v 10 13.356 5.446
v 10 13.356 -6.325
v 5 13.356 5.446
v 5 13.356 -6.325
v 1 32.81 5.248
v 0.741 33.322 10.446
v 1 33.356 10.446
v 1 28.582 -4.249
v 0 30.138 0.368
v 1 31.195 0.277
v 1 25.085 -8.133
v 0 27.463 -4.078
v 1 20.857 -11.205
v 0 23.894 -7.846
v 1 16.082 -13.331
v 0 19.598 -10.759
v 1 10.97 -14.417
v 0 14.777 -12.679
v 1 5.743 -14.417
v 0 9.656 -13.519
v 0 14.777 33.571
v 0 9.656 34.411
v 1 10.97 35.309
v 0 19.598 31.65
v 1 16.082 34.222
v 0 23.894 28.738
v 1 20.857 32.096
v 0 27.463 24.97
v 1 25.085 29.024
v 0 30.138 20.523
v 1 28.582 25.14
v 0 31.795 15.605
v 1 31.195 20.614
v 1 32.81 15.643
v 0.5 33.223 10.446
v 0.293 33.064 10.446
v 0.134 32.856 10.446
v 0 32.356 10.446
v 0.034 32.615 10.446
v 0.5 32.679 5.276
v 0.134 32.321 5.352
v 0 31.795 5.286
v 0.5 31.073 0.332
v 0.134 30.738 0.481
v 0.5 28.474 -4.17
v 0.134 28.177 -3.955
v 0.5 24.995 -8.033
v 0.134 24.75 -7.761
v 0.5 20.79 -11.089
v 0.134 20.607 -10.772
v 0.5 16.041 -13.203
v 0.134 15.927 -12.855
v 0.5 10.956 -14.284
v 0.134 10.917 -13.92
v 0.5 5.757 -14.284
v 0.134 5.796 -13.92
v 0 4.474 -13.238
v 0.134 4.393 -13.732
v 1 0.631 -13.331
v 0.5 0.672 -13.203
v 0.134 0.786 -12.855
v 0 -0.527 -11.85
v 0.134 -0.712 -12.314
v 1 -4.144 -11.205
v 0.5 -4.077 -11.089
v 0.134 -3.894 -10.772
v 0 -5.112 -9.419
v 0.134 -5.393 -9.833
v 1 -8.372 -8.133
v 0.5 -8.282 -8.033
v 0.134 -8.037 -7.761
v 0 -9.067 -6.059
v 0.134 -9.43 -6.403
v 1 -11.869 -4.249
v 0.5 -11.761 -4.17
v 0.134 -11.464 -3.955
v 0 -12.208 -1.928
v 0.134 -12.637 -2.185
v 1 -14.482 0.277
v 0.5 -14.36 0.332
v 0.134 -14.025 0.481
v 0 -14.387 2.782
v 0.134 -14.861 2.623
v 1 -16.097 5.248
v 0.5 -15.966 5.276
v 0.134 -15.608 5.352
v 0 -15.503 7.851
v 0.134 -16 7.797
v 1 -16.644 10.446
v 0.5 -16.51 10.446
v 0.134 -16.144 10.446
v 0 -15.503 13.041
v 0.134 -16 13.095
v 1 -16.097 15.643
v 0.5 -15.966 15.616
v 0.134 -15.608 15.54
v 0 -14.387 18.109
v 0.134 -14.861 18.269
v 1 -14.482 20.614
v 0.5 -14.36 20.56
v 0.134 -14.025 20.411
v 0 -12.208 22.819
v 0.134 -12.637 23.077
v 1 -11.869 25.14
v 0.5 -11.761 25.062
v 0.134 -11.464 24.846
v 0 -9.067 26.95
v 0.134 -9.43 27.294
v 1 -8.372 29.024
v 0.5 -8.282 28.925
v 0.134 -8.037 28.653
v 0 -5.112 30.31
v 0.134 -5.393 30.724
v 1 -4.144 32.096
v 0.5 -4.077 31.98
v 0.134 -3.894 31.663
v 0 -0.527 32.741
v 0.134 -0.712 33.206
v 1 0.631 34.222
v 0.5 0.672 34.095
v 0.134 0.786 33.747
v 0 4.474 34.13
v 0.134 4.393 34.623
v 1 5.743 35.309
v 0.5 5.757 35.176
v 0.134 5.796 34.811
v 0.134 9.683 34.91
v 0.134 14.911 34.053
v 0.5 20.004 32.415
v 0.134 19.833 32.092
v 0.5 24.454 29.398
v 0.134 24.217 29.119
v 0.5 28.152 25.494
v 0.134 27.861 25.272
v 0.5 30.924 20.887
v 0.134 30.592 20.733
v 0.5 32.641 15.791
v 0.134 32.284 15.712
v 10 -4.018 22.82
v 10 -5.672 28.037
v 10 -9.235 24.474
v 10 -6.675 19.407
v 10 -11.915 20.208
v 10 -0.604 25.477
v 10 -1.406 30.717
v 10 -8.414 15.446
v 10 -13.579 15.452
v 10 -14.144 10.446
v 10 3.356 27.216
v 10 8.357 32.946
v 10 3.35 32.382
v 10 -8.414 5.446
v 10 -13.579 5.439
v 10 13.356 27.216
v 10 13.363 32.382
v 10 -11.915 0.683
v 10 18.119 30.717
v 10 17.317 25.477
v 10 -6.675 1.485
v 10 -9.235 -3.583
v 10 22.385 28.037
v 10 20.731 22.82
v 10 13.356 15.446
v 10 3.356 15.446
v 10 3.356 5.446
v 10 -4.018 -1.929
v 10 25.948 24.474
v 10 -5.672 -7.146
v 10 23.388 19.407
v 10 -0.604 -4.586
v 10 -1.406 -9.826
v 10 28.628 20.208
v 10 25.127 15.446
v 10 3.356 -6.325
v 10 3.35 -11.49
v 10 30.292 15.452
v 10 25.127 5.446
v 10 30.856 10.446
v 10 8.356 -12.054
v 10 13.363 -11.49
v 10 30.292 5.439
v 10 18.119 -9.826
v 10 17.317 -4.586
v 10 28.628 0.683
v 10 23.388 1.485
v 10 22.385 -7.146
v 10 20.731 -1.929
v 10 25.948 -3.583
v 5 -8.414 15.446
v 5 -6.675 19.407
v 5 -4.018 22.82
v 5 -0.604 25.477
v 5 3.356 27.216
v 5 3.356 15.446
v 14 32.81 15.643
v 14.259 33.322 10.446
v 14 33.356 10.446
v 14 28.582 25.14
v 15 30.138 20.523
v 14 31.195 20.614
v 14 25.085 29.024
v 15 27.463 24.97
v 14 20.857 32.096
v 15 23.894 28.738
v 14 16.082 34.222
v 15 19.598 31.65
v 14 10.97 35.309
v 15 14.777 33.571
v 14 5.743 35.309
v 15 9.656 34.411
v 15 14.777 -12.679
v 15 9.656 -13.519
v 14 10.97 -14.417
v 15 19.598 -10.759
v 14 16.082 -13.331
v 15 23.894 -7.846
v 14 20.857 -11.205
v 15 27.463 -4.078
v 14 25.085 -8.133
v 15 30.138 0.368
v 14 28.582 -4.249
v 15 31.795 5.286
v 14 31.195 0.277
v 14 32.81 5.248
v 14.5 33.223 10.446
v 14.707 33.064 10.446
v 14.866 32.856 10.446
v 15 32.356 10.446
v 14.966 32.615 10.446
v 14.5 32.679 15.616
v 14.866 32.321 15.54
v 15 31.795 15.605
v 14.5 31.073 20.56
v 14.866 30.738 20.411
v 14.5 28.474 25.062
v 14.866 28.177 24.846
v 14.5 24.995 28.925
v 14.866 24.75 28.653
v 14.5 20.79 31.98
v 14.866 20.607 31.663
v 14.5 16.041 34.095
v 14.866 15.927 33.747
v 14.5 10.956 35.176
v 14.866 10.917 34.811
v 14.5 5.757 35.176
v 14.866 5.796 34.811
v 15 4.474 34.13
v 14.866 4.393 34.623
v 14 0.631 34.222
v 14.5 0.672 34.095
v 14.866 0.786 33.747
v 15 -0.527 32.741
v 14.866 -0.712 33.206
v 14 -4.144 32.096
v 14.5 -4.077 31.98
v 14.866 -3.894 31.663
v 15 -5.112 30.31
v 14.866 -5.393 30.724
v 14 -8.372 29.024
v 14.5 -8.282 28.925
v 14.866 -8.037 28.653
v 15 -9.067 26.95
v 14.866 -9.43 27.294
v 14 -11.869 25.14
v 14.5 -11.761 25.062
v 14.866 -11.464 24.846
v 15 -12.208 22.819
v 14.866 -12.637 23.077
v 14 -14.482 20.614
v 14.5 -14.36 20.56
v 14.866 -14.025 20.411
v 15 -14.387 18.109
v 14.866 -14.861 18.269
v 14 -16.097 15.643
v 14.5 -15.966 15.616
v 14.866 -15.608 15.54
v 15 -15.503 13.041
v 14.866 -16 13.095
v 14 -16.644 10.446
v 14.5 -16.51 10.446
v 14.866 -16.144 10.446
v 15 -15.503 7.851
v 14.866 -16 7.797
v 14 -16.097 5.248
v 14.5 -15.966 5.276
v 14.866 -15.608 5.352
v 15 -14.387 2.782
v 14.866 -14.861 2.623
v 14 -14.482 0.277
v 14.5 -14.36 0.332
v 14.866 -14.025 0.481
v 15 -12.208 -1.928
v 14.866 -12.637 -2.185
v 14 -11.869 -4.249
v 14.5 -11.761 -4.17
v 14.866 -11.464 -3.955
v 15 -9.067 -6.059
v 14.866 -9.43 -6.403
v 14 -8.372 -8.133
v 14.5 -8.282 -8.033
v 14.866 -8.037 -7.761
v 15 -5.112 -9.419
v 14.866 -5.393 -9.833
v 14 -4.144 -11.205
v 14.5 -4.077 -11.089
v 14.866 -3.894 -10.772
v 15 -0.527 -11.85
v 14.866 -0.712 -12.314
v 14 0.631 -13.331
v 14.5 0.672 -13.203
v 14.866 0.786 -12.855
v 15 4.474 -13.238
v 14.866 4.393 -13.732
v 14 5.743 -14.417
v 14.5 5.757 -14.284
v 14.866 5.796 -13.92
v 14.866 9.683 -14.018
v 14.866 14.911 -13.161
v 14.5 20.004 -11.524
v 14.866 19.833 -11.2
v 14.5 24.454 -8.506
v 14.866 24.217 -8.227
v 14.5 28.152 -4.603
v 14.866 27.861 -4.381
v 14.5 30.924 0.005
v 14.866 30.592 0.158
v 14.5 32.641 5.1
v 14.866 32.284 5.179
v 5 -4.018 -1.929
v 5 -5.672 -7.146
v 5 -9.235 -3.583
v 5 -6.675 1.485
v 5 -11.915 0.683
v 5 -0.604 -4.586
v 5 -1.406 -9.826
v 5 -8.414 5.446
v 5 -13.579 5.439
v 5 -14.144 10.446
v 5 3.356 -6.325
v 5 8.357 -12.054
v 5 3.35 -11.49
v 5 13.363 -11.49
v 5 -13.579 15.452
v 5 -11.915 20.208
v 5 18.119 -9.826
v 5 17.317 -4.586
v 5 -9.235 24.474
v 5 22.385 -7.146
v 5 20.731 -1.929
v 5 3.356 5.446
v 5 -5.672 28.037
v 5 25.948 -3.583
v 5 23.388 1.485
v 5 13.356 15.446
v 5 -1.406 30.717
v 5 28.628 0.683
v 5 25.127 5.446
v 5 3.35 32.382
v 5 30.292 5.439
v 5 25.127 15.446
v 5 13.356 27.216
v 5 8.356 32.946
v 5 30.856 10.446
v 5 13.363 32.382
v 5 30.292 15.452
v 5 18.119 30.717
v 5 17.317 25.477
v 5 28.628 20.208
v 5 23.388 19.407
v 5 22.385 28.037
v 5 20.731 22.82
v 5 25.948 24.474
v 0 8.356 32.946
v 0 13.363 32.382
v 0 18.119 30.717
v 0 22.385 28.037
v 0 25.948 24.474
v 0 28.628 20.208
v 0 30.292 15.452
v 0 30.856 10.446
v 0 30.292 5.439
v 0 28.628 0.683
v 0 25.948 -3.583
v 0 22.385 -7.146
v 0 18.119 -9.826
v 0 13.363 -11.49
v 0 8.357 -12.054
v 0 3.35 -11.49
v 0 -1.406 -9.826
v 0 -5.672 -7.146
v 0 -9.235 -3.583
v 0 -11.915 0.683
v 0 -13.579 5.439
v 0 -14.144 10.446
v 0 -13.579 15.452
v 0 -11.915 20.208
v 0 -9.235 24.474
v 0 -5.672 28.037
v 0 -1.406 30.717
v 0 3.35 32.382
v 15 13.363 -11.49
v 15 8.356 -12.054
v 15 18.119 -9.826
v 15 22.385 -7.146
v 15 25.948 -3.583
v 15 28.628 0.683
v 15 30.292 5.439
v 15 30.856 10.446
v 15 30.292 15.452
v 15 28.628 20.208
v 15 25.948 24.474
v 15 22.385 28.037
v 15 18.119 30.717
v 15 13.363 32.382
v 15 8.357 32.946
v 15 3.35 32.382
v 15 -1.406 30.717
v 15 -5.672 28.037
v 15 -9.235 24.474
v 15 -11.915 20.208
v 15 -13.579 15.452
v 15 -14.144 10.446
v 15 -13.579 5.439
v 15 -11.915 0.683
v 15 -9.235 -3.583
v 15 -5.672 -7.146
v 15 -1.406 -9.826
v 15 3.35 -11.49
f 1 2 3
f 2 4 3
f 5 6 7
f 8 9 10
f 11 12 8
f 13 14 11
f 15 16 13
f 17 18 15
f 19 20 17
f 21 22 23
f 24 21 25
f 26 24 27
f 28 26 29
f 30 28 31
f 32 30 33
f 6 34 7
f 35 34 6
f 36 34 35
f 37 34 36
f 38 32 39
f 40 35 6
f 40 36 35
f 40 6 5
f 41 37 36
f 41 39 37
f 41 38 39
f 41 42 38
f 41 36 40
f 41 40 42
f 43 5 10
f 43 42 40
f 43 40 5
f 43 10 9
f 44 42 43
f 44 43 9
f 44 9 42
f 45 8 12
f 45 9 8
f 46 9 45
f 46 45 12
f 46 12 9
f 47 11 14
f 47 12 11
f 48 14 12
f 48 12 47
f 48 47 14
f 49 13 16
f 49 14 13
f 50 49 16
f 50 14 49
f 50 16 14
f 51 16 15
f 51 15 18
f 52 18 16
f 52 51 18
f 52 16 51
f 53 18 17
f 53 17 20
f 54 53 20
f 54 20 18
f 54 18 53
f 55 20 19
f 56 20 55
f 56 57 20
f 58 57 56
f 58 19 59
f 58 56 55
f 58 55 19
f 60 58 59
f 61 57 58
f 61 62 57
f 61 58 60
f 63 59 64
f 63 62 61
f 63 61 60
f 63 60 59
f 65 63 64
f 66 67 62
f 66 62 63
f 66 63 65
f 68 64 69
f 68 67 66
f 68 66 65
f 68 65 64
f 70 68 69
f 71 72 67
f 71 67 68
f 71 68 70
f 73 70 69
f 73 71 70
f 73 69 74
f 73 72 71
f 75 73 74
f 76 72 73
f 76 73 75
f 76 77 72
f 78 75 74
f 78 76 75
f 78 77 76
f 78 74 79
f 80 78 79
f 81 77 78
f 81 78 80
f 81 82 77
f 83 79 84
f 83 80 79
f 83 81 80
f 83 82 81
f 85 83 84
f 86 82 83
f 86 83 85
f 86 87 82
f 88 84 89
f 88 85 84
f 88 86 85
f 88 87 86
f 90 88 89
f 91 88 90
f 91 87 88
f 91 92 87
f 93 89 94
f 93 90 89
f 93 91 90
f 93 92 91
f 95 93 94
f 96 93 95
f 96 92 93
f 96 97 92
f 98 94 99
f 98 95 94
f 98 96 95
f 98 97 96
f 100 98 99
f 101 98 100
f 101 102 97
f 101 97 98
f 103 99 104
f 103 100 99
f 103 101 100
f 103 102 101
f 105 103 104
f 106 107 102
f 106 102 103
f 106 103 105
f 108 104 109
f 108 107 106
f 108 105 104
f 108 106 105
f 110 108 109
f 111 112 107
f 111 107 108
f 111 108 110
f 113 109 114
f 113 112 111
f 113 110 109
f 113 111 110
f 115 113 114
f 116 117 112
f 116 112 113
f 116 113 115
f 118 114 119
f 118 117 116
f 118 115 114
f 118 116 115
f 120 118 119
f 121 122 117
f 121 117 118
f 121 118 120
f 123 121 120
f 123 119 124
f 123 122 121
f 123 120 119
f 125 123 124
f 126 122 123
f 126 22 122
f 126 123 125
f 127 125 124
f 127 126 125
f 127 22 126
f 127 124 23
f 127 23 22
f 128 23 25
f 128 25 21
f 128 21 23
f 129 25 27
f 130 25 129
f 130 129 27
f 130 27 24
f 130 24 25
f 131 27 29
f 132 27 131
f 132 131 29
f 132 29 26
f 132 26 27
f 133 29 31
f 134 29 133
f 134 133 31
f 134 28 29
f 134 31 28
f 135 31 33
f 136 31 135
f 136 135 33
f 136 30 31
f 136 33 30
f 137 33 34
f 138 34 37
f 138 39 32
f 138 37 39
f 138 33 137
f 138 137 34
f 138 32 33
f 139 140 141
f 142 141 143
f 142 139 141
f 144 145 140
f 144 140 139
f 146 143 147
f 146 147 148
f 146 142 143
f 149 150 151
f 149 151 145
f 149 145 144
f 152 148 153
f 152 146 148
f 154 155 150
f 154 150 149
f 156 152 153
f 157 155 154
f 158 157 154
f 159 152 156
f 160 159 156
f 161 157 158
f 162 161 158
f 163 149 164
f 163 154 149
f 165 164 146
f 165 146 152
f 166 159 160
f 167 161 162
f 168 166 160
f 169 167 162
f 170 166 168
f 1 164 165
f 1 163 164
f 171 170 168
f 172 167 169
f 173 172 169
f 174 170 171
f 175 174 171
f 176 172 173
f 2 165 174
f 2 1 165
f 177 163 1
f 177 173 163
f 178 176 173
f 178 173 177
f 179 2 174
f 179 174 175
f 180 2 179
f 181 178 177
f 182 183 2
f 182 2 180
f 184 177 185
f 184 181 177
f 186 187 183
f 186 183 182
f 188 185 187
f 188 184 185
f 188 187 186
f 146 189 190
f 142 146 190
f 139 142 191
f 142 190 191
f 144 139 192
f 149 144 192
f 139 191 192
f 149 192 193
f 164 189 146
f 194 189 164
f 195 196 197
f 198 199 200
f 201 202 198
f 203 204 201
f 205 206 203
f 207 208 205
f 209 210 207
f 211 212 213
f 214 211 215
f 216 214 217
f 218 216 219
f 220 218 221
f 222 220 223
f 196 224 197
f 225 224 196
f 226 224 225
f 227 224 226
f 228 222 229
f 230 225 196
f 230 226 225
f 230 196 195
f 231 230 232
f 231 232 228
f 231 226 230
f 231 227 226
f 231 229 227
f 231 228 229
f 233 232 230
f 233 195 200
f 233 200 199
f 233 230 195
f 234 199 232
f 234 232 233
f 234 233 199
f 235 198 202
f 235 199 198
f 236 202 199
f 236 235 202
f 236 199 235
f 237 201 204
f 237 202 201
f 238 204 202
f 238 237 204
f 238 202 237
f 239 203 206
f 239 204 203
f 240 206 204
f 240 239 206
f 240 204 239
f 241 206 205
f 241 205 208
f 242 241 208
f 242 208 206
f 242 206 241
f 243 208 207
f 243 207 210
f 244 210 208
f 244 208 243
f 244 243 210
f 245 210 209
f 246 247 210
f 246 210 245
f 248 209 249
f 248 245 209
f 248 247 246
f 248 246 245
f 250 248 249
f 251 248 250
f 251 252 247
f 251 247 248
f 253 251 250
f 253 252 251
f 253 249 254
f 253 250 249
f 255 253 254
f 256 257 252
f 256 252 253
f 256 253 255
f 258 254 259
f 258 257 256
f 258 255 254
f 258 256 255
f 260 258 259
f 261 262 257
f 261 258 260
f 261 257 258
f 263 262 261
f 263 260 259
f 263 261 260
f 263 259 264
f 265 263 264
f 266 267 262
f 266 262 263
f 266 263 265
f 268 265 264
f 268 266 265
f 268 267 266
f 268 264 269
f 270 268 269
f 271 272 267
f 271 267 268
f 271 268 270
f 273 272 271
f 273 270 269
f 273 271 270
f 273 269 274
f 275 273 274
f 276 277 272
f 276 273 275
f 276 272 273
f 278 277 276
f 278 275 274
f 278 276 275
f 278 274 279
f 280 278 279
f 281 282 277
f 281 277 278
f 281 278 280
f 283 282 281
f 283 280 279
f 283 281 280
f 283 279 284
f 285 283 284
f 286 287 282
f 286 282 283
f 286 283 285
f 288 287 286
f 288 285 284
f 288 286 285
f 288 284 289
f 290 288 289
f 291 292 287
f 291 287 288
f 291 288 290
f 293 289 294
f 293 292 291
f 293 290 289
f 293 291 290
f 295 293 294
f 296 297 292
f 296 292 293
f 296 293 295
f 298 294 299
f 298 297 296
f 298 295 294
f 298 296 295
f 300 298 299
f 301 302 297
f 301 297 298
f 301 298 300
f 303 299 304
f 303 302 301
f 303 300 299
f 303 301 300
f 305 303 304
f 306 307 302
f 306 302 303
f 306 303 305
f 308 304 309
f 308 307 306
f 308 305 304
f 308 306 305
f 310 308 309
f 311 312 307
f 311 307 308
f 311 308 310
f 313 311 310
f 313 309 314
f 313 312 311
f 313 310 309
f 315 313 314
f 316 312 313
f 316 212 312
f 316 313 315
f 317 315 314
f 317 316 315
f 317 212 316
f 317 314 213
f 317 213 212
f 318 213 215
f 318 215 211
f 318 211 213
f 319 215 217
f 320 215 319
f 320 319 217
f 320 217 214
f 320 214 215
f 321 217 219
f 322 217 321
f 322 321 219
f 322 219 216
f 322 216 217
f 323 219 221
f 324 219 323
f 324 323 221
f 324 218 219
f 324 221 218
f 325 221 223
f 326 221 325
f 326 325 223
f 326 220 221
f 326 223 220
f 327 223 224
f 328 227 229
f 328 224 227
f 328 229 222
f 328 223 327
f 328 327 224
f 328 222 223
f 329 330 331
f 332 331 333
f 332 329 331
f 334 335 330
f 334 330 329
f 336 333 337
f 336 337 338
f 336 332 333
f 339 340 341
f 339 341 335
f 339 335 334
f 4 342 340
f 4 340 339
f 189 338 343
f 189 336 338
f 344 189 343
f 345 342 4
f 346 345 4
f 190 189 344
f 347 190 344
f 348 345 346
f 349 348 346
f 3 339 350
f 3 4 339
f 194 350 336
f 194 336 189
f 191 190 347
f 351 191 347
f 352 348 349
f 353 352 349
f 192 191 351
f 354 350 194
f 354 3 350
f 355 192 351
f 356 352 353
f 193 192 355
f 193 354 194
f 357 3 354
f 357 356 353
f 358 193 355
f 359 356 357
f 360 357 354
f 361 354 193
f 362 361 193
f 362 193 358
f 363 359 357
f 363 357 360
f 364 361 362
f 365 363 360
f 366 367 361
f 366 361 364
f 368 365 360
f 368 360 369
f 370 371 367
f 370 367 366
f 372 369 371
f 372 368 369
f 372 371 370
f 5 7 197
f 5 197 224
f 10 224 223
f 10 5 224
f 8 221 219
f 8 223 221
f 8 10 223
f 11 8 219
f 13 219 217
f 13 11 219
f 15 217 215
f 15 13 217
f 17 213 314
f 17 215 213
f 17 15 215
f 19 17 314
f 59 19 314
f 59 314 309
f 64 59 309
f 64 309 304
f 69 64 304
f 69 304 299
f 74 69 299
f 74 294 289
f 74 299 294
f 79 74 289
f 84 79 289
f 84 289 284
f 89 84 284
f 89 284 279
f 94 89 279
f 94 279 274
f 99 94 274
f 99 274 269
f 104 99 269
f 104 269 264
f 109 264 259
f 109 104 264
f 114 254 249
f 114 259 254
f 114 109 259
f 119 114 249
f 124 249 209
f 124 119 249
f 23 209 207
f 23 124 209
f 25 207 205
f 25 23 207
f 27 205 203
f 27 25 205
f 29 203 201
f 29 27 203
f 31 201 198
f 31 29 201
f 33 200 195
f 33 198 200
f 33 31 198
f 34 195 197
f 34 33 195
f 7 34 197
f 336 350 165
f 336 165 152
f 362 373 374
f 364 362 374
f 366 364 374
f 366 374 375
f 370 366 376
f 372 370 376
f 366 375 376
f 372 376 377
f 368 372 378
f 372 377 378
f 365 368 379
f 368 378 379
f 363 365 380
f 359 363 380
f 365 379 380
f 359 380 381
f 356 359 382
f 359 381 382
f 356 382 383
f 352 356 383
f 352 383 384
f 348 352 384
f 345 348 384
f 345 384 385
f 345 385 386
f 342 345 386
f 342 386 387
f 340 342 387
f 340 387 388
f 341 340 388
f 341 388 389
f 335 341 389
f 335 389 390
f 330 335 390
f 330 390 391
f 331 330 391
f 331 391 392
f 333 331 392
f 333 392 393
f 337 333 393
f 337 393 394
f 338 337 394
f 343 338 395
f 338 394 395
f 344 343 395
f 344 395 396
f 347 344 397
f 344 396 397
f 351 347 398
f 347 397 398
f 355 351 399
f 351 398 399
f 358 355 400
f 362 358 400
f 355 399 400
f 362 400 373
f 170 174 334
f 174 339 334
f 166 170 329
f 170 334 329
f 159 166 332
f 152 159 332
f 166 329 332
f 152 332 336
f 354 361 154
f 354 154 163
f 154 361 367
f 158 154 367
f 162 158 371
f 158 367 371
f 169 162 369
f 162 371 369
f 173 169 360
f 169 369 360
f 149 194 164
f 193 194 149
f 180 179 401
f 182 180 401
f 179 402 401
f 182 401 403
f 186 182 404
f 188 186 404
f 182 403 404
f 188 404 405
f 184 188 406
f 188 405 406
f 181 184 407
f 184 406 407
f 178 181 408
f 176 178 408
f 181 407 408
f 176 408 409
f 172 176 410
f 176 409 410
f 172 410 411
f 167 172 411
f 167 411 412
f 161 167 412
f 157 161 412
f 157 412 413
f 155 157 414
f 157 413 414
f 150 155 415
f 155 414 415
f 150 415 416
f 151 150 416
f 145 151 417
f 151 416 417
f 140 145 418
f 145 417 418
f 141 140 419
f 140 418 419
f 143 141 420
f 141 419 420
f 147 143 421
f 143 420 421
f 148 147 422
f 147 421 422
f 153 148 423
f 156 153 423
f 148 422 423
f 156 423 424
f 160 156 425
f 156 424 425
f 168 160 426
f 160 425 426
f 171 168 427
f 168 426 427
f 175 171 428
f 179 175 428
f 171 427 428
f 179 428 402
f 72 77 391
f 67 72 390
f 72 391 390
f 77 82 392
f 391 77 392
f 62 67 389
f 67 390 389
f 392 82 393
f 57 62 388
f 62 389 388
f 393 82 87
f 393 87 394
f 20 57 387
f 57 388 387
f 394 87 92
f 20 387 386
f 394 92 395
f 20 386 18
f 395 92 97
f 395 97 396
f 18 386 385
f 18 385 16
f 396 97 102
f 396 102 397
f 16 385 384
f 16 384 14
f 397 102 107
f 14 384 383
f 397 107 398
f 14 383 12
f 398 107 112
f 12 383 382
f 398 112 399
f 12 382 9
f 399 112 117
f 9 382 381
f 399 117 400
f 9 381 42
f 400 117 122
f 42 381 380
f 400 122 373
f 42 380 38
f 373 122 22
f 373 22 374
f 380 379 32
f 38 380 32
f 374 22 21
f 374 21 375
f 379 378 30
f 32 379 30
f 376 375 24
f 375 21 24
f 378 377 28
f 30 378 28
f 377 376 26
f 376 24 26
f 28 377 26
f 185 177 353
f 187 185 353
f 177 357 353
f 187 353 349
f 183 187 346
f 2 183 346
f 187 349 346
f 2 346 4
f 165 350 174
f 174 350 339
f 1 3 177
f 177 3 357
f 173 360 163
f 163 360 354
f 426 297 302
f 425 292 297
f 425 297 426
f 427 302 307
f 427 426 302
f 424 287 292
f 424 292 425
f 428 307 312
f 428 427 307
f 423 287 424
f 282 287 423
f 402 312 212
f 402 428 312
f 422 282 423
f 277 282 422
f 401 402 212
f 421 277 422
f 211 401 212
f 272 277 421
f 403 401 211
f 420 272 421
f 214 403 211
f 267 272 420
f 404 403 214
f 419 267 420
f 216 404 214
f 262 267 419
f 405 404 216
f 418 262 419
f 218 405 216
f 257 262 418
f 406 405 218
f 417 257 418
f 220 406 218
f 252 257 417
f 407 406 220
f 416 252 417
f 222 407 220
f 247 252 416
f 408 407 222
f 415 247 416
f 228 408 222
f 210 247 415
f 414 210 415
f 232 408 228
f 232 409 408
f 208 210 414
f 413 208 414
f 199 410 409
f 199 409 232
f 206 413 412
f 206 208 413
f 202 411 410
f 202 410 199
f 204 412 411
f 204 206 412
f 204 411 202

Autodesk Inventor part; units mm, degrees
ref_plane "YZ Plane" through (0, 0, 0) normal (1, 0, 0) x (0, 1, 0)
ref_plane "XZ Plane" through (0, 0, 0) normal (0, 1, 0) x (-1, 0, 0)
ref_plane "XY Plane" through (0, 0, 0) normal (0, 0, 1) x (1, 0, 0)
sketch "Эскиз1" plane through (0, 0, 0) normal (1, 0, 0) x (0, 1, 0)
  circle A0 centre (8.3565, 10.4457) radius 25
  point P0 (0, 0)
  dimension "d0" = 50
extrude "Выдавливание1" add sketch "Эскиз1" along normal blind 15
sketch "Эскиз2" plane through (0, 8.3565, 10.4457) normal (-1, 0, 0) x (0, 0, 1)
  circle A0 centre (0, 0) radius 22.5
  point P0 (-10.4457, -8.3565)
  dimension "d3" = 45
extrude "Выдавливание2" cut sketch "Эскиз2" against normal blind 5
sketch "Эскиз3" plane through (15, 8.3565, 10.4457) normal (1, 0, 0) x (0, 0, -1)
  circle A0 centre (0, 0) radius 22.5
  point P0 (10.4457, -8.3565)
  dimension "d6" = 45
extrude "Выдавливание3" cut sketch "Эскиз3" against normal blind 5
sketch "Эскиз7" plane through (5, 8.3565, 10.4457) normal (-1, 0, 0) x (0, 0, 1)
  circle A0 centre (0, 0) radius 5
  line L0 (5, 0) -> (-5, 0)
  line L1 (-5, 0) -> (-5, 30.8448)
  line L2 (-5, 30.8448) -> (5, 30.8448)
  line L3 (5, 30.8448) -> (5, 0)
  line L4 (5, 0) -> (-5, 0)
  line L5 (-5, 0) -> (-5, -27.2335)
  line L6 (-5, -27.2335) -> (5, -27.2335)
  line L7 (5, -27.2335) -> (5, 0)
  line L8 (0, -5) -> (31.8043, -5)
  line L9 (31.8043, -5) -> (31.8043, 5)
  line L10 (31.8043, 5) -> (0, 5)
  line L11 (0, 5) -> (0, -5)
  line L12 (0, -5) -> (-27.8953, -5)
  line L13 (-27.8953, -5) -> (-27.8953, 5)
  line L14 (-27.8953, 5) -> (0, 5)
  line L15 (0, 5) -> (0, -5)
  circle A1 centre (0, 0) radius 22.5
  circle A2 centre (0, 0) radius 17.5
  point P0 (-10.4457, -8.3565)
  point P1 (5, -16.7705)
  point P2 (16.7705, -5)
  point P3 (5, -5)
  point P4 (-16.7705, -5)
  point P5 (-5, -16.7705)
  point P6 (-5, -5)
  point P7 (16.7705, 5)
  point P8 (5, 16.7705)
  point P9 (5, 5)
  point P10 (-5, 16.7705)
  point P11 (-16.7705, 5)
  point P12 (-5, 5)
  dimension "d13" = 10
  dimension "d14" = 35
extrude "Выдавливание4" cut sketch "Эскиз7" against normal blind 10 contours L3 A2 L10 | L8 A2 L7 | L14 A2 L1 | L5 A2 L12
fillet "Сопряжение1" radius 1 2 edges at (15, -16.6435, 10.4457) (0, -16.6435, 10.4457)
properties part number "колесо" material "Пластик САН"
